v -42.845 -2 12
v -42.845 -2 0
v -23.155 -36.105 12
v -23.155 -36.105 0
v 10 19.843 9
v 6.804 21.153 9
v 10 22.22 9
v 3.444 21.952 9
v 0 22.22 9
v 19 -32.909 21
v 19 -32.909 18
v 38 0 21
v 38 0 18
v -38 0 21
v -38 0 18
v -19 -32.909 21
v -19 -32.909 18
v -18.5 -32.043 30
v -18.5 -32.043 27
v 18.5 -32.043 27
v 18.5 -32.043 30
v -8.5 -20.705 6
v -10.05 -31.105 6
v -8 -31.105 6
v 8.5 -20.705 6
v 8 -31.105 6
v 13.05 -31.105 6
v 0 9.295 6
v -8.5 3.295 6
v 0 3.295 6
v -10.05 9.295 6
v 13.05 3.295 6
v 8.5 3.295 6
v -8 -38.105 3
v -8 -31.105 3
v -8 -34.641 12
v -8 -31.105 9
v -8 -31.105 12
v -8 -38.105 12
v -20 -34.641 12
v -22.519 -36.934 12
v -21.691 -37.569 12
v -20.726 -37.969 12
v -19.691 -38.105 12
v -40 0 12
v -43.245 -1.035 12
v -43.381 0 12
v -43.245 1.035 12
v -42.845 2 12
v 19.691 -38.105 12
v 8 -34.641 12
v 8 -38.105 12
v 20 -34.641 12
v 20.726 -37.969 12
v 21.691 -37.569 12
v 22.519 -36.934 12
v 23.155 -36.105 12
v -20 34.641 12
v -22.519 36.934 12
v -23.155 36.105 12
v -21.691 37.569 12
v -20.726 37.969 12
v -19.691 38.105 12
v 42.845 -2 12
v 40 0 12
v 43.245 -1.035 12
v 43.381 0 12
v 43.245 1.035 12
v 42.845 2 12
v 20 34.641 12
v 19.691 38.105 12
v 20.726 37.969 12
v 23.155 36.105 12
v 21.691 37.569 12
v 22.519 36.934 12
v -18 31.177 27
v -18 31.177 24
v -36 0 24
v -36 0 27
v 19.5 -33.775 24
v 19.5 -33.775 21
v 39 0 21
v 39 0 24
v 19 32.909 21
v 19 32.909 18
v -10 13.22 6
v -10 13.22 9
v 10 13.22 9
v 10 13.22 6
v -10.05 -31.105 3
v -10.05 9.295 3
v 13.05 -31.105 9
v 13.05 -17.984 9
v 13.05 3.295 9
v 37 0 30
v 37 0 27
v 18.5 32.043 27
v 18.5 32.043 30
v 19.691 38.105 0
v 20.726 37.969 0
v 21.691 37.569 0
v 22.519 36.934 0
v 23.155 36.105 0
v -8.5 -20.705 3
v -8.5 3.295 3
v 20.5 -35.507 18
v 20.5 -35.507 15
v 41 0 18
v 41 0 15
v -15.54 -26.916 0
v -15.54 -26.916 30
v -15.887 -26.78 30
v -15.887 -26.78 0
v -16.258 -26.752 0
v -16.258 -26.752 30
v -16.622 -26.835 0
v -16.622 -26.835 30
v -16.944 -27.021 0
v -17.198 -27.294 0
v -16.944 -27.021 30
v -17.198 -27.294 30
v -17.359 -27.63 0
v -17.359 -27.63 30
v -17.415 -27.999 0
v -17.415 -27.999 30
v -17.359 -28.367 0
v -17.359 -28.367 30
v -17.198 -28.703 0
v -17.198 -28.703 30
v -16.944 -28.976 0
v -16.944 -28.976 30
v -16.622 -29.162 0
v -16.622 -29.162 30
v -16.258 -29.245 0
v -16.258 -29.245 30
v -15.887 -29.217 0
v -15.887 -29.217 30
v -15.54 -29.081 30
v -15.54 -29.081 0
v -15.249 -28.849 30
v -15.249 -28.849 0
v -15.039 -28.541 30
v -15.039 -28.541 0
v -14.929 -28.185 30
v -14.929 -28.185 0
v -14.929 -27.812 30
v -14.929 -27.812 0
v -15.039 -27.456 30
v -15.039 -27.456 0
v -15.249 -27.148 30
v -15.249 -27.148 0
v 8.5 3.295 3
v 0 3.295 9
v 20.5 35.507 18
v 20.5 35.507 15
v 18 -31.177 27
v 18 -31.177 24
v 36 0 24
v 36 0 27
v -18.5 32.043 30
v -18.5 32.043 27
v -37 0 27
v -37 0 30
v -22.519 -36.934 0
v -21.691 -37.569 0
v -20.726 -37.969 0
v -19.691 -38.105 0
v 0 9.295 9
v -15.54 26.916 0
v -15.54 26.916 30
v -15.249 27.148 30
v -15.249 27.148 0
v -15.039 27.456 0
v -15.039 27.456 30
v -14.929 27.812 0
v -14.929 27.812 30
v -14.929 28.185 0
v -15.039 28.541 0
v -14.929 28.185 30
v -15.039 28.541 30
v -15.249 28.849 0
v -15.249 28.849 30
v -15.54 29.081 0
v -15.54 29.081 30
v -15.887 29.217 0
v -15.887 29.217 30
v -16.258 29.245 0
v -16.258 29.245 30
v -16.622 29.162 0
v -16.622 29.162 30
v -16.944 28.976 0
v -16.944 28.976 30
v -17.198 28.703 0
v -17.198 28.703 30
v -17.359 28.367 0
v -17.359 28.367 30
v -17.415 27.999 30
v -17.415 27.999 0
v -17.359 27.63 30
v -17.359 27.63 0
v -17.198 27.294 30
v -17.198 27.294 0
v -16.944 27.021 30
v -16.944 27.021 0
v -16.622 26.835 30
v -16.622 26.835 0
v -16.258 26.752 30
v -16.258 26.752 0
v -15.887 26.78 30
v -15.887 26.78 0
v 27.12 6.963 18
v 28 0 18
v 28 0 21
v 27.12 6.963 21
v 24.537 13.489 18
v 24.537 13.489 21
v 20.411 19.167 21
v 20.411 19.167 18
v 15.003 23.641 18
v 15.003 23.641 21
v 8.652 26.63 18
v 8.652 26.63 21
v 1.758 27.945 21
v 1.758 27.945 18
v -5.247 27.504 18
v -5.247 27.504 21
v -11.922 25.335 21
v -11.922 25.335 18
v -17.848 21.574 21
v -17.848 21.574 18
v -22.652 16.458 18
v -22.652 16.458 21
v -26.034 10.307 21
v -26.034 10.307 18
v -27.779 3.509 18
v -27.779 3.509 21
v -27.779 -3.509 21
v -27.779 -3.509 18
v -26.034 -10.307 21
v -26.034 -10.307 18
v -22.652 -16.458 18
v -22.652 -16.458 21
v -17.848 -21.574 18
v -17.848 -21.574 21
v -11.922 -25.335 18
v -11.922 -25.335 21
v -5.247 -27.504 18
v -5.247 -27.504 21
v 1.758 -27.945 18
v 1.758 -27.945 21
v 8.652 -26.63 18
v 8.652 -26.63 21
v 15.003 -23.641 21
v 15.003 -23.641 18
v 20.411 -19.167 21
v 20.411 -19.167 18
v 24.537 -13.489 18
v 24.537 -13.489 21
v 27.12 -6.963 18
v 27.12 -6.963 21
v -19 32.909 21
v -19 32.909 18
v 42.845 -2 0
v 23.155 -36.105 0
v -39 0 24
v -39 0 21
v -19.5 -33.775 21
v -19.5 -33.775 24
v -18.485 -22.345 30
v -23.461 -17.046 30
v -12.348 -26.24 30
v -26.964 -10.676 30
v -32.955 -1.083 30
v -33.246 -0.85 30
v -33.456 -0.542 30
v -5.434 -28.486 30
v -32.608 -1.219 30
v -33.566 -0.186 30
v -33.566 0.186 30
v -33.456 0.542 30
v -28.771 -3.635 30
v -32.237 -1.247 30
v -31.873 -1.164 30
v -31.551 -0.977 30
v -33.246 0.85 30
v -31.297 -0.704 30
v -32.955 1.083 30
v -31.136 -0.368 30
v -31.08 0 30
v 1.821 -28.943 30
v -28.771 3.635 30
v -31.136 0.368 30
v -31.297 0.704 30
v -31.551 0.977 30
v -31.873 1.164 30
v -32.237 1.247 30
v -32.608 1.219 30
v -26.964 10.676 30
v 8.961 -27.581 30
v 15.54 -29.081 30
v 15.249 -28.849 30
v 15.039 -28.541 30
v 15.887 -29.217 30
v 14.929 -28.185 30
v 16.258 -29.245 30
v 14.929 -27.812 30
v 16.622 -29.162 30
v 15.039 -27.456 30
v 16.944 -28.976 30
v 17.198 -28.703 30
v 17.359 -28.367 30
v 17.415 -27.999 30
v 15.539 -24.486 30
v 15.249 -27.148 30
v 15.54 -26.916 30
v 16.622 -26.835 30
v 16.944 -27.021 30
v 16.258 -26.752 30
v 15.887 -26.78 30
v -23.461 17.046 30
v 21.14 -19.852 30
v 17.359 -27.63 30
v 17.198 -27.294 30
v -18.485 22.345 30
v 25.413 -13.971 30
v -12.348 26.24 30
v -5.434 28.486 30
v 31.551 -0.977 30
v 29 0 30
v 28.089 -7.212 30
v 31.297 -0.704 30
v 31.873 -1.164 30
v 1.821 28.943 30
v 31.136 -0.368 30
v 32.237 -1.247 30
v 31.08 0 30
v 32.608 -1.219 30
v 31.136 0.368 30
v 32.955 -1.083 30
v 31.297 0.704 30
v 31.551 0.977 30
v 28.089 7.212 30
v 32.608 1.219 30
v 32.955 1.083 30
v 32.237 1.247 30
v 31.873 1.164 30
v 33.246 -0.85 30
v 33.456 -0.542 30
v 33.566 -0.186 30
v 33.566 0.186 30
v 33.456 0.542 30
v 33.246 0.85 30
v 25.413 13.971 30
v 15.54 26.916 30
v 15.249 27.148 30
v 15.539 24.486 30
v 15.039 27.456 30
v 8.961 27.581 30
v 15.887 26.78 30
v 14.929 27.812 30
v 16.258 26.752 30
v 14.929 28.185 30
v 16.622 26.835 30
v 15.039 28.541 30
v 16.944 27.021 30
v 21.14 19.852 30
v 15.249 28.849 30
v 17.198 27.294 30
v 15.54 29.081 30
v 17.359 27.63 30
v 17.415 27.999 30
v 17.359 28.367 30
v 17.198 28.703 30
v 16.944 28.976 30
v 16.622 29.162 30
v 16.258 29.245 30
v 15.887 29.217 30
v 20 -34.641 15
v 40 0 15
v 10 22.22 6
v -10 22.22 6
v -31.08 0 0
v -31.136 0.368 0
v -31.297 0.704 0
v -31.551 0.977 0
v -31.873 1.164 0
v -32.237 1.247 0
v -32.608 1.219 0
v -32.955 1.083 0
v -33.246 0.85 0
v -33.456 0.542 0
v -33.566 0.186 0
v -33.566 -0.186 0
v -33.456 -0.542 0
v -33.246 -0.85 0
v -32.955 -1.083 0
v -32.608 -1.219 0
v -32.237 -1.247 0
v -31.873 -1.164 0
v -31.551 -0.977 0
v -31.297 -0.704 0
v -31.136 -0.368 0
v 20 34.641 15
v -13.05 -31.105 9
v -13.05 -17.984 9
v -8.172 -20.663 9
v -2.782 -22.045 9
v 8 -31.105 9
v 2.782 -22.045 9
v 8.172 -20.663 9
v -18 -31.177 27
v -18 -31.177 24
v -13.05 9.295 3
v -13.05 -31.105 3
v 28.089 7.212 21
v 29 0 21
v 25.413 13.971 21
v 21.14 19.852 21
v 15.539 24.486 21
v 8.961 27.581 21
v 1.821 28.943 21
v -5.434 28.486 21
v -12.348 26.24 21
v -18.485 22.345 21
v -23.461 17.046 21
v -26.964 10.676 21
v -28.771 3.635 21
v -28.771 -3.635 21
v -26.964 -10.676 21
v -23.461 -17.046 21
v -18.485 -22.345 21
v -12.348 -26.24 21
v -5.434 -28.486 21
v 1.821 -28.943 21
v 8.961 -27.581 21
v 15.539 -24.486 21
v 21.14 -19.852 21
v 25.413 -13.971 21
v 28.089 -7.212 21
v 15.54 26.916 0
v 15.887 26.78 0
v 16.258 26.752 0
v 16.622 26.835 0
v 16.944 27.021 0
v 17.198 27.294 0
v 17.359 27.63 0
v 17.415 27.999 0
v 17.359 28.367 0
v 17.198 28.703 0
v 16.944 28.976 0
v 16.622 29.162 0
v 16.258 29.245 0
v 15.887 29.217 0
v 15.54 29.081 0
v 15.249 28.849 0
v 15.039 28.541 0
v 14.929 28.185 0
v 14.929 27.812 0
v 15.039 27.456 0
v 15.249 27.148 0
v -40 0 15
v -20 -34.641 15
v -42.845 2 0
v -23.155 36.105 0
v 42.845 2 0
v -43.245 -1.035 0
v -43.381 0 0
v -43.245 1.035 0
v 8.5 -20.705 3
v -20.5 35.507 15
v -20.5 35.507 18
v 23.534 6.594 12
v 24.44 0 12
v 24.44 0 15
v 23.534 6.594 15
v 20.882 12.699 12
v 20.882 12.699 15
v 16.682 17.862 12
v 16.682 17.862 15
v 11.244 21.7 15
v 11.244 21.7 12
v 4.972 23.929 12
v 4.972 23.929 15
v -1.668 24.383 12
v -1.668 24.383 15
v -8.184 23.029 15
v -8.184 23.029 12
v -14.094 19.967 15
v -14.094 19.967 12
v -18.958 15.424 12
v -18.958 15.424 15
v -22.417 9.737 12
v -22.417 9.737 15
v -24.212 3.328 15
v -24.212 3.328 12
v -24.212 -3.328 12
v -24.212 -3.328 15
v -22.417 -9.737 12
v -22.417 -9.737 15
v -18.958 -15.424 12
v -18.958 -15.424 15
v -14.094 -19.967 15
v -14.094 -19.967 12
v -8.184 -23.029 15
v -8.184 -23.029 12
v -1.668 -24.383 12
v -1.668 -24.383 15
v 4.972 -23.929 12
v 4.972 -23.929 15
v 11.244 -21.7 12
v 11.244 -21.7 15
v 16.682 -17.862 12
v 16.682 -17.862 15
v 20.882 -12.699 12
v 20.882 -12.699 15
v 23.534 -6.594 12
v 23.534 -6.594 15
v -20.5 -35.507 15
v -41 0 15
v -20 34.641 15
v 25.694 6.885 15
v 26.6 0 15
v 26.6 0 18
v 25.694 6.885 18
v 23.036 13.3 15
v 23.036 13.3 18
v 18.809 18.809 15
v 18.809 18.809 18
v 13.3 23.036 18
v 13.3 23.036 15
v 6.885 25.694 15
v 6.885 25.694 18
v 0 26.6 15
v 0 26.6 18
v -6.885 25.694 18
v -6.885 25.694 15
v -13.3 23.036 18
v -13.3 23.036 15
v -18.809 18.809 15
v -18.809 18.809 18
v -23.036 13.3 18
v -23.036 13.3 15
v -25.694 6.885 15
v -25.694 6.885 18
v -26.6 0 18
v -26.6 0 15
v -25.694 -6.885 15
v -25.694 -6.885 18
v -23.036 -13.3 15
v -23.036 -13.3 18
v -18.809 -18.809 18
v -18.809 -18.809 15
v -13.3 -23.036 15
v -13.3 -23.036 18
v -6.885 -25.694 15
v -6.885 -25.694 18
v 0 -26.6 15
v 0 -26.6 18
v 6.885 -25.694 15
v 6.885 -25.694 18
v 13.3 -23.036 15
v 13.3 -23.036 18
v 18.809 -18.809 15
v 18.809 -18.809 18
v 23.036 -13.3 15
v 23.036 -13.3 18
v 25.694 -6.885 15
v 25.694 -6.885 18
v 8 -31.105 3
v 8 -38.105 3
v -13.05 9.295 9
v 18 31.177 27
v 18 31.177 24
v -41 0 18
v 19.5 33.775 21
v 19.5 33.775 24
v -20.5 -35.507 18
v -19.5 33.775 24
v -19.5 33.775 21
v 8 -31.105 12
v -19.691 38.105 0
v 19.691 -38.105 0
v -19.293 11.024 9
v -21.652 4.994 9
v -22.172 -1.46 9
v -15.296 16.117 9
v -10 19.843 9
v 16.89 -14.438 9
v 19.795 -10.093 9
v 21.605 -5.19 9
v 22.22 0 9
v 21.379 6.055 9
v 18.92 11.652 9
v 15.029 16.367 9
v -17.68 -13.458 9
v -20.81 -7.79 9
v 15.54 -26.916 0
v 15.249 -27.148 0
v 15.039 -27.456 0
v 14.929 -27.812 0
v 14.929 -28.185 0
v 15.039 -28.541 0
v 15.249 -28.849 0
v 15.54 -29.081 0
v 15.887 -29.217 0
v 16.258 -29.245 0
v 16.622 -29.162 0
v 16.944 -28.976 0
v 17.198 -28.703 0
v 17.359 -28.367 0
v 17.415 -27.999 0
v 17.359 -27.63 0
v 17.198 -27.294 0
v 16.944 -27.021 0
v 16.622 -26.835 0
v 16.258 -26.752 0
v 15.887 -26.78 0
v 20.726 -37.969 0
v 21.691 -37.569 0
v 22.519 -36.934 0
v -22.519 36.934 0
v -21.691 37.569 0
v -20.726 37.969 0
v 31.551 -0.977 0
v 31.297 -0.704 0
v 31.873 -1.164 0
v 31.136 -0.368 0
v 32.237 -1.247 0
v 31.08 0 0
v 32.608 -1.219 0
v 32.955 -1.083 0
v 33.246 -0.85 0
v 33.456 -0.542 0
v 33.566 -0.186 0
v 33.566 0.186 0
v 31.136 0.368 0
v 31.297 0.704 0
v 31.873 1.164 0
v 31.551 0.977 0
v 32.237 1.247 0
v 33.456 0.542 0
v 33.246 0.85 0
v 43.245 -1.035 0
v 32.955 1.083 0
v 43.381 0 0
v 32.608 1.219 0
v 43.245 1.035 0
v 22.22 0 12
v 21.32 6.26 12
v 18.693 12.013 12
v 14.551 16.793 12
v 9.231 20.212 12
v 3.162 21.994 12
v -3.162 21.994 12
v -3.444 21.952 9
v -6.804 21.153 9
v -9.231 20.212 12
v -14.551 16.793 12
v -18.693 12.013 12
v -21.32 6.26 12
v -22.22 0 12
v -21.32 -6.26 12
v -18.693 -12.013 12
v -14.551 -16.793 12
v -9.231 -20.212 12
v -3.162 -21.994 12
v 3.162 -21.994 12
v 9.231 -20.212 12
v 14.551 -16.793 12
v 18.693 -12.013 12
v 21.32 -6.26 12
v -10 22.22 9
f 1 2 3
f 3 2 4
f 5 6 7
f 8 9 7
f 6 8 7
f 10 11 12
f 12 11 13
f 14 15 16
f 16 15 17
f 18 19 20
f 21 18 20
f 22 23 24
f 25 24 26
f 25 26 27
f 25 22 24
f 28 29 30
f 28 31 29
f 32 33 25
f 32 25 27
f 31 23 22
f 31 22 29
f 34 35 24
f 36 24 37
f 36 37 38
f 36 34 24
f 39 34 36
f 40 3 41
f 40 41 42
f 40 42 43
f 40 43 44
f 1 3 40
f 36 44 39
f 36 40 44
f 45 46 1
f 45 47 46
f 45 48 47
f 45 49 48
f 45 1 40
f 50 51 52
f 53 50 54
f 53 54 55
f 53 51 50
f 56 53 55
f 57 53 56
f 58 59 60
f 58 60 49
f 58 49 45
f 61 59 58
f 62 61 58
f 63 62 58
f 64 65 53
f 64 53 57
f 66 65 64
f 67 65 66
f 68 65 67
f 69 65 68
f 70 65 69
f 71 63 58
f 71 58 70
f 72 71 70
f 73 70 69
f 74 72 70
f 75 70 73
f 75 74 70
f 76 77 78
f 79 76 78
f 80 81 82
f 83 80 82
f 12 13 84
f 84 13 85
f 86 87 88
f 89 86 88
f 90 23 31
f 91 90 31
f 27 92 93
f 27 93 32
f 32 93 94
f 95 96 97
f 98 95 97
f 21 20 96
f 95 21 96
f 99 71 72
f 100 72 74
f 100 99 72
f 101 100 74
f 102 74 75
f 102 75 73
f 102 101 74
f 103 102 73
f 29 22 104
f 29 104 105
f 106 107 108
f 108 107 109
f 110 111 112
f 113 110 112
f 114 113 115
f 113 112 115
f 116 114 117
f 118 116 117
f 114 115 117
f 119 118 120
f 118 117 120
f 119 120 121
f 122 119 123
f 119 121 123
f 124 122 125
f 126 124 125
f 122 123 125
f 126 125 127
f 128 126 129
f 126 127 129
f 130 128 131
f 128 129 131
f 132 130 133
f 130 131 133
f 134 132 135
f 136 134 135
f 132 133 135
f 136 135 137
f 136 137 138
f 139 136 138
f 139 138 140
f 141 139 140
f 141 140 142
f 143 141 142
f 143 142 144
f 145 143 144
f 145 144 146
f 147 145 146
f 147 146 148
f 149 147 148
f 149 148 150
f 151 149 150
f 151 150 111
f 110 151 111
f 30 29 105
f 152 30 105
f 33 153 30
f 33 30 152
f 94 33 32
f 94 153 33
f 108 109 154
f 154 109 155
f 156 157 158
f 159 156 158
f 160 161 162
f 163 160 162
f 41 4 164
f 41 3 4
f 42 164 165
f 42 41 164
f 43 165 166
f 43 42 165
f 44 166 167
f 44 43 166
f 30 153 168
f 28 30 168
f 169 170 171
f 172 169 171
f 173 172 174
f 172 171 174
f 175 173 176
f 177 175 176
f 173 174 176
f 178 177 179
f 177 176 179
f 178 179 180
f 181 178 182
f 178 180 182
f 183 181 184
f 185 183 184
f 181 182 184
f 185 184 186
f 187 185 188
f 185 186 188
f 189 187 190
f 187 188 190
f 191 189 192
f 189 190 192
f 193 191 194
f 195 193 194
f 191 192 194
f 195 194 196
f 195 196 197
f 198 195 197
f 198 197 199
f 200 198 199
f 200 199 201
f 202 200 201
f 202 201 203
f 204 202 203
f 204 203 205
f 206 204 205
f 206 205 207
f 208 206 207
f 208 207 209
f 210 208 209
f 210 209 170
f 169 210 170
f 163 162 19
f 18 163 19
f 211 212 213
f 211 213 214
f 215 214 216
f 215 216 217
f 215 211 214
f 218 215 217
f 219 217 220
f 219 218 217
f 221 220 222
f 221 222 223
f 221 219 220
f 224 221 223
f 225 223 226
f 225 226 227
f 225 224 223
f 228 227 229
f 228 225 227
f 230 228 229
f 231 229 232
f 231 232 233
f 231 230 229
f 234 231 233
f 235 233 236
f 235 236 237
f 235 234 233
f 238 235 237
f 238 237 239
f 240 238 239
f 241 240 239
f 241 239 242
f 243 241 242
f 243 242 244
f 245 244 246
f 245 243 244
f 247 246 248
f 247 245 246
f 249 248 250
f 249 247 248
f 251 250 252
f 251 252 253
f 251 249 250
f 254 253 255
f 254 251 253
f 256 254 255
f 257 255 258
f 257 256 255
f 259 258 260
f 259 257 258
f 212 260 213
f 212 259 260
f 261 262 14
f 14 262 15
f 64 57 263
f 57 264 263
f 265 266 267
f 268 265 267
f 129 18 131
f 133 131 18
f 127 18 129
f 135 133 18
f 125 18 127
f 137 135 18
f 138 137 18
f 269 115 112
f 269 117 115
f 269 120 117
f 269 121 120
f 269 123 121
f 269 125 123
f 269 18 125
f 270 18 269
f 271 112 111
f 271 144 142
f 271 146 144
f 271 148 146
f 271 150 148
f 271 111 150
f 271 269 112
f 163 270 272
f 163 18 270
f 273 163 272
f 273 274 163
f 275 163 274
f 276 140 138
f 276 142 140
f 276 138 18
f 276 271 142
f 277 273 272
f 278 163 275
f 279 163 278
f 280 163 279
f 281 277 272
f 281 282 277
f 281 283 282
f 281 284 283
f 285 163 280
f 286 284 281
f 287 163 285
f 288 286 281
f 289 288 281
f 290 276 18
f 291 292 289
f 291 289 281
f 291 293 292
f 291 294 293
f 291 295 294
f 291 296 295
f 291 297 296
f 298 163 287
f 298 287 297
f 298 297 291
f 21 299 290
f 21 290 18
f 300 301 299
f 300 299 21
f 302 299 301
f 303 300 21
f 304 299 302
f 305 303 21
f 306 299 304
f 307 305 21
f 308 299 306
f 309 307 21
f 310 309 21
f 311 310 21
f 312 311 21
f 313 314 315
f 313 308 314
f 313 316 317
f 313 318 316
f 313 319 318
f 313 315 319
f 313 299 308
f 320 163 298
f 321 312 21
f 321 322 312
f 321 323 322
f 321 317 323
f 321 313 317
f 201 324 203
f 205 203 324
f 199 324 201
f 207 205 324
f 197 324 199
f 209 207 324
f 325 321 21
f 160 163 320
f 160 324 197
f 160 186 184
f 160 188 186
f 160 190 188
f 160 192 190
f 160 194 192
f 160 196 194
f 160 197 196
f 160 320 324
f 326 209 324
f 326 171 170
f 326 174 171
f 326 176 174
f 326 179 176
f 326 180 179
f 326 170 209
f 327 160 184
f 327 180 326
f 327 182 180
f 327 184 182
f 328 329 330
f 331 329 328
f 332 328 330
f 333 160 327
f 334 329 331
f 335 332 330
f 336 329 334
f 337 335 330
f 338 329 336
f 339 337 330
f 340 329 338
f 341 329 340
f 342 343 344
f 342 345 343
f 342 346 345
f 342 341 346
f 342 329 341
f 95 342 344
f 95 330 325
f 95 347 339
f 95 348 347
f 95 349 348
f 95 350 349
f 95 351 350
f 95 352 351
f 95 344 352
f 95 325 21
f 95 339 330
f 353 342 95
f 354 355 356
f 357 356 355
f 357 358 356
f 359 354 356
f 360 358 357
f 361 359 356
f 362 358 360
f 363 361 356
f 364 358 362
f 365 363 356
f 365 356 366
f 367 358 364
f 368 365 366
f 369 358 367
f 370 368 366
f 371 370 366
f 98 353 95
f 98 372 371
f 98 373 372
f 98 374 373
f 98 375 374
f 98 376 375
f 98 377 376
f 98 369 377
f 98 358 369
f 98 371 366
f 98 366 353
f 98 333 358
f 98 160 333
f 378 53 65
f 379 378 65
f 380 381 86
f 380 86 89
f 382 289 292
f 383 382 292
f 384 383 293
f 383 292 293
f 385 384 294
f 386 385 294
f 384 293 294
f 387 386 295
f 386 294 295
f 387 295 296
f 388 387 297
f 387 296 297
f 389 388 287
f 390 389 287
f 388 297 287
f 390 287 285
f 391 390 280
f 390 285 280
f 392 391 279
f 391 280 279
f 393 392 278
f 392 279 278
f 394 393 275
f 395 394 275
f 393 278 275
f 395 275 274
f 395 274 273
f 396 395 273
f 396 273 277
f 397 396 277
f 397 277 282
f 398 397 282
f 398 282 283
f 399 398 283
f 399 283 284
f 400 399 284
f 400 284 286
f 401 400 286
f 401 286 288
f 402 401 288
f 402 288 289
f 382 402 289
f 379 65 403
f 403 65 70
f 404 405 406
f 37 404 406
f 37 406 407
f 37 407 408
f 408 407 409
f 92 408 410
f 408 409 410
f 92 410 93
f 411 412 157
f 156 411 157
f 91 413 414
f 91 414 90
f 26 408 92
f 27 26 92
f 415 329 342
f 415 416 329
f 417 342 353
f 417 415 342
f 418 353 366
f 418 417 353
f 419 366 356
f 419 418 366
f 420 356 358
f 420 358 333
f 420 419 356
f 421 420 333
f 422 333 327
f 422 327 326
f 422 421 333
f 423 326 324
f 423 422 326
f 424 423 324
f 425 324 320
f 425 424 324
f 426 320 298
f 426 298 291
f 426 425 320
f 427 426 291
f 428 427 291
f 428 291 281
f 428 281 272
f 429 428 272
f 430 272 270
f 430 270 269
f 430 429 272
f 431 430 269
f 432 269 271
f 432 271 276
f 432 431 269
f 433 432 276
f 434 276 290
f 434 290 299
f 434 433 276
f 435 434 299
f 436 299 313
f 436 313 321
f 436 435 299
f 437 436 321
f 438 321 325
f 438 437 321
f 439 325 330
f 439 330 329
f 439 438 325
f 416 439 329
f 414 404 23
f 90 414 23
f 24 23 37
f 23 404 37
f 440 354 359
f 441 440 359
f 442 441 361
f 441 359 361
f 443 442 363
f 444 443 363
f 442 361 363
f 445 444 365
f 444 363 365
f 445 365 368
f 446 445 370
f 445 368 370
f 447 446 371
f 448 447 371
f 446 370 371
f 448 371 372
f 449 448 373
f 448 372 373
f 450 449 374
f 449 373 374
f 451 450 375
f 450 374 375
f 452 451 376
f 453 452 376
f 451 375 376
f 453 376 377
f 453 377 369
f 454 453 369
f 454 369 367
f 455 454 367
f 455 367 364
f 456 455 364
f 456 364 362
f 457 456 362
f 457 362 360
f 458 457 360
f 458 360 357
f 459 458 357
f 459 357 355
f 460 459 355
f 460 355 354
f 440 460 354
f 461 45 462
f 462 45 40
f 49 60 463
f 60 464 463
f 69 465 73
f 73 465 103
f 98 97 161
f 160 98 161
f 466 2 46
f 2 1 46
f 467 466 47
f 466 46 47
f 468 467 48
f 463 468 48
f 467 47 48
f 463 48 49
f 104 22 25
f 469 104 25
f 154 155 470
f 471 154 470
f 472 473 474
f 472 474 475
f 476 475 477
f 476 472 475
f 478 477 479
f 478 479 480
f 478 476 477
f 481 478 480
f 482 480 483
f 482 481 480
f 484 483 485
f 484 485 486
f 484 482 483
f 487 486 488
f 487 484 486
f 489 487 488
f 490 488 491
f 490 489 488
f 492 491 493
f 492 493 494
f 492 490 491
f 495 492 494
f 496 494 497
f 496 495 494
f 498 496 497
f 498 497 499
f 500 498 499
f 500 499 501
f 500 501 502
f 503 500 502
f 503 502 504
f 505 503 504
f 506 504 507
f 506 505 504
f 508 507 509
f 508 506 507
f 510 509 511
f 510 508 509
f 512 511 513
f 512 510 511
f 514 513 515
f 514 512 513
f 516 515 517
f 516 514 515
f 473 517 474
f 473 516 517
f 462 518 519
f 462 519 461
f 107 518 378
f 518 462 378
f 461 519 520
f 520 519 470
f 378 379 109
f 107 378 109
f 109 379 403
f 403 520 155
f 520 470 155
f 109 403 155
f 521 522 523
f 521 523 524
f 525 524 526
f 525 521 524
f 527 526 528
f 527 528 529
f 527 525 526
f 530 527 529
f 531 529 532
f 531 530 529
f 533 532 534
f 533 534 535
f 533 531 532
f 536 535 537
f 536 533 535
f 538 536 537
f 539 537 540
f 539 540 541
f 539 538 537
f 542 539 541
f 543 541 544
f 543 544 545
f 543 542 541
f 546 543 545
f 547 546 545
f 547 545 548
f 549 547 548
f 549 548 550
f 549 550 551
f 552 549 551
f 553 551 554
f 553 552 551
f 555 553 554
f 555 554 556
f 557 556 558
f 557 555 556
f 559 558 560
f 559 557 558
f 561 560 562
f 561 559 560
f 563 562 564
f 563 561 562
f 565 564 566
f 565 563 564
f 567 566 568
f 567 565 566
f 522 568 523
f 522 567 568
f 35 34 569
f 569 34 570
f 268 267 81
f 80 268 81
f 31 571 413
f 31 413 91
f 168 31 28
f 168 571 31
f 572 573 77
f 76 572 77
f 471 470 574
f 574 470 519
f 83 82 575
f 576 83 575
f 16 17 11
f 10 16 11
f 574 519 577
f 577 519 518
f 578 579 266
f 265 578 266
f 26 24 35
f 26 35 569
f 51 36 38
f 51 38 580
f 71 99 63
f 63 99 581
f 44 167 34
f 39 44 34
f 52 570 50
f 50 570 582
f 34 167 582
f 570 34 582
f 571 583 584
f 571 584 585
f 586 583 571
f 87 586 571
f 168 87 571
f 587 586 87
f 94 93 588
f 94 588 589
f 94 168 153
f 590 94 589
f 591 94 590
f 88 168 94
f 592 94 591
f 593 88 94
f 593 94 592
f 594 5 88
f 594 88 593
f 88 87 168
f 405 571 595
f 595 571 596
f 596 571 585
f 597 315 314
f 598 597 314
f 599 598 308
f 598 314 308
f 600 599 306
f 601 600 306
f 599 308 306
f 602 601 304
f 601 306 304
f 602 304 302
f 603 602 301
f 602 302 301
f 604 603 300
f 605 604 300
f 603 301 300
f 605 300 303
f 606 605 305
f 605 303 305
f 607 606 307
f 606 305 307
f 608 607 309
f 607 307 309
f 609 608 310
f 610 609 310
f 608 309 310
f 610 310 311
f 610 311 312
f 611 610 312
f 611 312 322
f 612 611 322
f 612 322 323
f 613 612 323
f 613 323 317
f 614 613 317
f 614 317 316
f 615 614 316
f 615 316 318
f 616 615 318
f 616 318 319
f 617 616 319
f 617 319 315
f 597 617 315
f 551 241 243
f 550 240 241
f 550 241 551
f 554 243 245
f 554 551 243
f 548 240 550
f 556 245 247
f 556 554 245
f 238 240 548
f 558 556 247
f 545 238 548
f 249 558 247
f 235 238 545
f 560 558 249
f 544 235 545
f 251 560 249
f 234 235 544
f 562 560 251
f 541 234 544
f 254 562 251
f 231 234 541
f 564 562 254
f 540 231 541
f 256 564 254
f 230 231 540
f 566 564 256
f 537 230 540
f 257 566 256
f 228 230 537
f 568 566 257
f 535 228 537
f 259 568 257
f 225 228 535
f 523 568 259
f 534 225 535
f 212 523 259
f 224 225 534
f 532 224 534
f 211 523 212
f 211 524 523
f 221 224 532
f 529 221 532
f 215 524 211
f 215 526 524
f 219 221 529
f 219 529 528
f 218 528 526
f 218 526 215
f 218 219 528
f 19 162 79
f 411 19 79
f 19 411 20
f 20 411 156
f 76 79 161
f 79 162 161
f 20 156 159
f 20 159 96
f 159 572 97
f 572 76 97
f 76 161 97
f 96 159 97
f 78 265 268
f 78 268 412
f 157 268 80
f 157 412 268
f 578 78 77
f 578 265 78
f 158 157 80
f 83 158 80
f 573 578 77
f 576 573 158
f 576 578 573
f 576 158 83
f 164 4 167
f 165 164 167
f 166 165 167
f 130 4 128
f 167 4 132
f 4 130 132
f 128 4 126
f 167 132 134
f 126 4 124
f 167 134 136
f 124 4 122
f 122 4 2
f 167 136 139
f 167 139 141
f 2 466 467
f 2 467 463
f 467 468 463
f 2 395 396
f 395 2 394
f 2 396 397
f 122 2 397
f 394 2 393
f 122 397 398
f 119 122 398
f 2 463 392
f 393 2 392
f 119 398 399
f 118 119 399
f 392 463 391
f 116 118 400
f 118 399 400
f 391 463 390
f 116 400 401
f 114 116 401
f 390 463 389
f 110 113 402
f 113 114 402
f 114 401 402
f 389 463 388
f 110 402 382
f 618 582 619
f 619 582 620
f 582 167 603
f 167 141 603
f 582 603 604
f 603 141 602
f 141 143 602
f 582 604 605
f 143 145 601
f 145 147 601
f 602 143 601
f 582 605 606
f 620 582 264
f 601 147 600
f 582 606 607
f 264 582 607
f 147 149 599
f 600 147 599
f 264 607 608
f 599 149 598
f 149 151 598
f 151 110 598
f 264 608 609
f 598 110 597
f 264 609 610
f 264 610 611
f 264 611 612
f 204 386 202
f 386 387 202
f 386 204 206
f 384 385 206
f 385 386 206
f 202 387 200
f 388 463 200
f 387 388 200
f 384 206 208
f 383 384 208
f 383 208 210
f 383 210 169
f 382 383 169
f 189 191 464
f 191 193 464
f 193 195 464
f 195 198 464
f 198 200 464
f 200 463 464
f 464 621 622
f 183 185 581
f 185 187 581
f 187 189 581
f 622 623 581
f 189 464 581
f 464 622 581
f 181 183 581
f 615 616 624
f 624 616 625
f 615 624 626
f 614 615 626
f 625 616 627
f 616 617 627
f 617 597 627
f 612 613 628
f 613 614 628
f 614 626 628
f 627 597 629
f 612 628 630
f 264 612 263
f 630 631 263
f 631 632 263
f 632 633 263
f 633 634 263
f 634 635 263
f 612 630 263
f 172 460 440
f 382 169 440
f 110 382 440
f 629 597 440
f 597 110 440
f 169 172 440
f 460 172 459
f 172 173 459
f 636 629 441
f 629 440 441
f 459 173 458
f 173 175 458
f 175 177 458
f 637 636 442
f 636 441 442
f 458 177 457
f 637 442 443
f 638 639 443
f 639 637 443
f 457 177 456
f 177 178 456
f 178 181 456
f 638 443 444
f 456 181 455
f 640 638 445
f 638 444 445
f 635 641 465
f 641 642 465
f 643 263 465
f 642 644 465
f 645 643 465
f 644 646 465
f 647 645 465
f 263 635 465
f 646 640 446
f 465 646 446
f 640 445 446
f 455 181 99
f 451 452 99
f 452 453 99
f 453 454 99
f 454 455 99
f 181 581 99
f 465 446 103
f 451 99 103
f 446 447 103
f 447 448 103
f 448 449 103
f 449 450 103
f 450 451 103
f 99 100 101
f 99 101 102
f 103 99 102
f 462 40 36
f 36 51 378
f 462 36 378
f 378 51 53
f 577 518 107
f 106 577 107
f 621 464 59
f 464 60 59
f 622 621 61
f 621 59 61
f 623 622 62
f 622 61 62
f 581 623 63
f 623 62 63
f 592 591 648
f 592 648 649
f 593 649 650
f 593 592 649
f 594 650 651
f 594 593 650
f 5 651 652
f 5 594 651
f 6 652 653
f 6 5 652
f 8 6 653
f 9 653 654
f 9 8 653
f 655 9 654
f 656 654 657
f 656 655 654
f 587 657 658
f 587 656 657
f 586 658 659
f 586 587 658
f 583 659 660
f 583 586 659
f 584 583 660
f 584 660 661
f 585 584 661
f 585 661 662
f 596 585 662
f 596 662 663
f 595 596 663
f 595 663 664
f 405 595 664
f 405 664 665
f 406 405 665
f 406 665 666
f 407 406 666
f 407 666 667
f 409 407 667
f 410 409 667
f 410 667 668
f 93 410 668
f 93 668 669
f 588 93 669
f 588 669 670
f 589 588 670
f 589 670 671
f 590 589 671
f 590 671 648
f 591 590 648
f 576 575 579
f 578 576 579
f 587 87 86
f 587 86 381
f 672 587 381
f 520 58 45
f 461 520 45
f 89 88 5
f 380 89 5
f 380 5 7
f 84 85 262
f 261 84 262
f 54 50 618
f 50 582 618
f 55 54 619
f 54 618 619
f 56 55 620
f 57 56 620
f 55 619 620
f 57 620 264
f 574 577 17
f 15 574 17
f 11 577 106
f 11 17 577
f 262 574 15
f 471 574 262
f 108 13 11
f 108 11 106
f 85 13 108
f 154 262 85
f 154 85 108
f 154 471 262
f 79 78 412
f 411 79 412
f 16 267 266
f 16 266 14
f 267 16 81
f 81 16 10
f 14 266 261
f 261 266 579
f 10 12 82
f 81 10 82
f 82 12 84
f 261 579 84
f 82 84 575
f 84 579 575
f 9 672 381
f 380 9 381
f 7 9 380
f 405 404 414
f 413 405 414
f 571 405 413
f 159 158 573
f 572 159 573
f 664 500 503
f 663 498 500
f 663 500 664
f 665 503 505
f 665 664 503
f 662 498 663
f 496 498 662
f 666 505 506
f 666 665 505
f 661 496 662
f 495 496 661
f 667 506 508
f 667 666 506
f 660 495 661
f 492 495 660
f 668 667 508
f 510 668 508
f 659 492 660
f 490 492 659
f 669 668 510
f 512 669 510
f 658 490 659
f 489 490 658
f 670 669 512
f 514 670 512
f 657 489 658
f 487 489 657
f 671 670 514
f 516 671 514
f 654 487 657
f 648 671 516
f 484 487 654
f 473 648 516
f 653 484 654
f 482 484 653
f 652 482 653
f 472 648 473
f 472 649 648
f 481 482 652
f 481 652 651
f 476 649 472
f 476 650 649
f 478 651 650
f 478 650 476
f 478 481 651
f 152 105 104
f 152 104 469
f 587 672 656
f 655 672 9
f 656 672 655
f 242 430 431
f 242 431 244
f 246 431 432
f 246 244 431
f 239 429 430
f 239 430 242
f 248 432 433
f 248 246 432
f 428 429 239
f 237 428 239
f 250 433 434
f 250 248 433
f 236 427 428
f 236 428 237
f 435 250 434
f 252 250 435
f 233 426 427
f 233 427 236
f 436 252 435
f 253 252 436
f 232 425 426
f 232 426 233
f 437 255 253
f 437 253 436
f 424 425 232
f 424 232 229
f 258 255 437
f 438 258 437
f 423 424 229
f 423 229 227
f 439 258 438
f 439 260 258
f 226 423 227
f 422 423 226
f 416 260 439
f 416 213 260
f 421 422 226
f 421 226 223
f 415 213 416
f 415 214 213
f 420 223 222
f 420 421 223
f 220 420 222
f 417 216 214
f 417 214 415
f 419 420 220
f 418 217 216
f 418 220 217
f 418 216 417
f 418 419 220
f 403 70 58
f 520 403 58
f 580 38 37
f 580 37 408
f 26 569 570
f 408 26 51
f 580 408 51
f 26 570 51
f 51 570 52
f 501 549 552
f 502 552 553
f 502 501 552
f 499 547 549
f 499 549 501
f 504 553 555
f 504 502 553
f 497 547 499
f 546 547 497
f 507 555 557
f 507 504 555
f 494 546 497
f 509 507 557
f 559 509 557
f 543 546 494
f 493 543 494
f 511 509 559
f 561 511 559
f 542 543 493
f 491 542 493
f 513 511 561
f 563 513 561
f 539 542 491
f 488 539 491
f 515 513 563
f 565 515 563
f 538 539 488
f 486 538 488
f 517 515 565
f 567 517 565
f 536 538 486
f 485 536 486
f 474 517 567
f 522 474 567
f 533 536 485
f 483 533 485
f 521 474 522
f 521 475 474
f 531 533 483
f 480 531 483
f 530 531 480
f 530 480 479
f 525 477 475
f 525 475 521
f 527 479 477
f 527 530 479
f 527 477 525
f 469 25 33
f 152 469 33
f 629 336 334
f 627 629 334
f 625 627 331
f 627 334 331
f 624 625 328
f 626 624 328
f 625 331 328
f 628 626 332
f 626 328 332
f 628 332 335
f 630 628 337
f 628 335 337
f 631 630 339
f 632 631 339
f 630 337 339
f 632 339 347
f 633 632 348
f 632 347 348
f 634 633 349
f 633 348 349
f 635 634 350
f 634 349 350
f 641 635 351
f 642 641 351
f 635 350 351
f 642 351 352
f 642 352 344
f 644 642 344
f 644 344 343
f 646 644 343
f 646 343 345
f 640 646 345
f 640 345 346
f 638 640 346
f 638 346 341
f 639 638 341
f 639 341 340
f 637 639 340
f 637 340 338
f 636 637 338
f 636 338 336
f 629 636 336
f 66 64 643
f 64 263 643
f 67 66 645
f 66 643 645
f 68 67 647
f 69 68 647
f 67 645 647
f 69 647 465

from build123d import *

# Parameters (mm, degrees)
PAD_DEPTH          = 9
SKETCH001_W        = 26.1
SKETCH001_H        = 34.4
POCKET_DEPTH       = 3
SKETCH002_R        = 22.22
PAD001_DEPTH       = 3
SKETCH003_R        = 24.44
PAD002_DEPTH       = 3
SKETCH004_R        = 26.6
PAD003_DEPTH       = 3
SKETCH005_R        = 28
PAD004_DEPTH       = 3
SKETCH006_R        = 29
PAD005_DEPTH       = 3
SKETCH007_R        = 29
PAD006_DEPTH       = 3
SKETCH008_R        = 29
PAD007_DEPTH       = 3
SKETCH009_W        = 17
SKETCH009_H        = 24
POCKET001_DEPTH    = 3
SKETCH010_W        = 16
SKETCH010_H        = 9
POCKET002_DEPTH    = 7
SKETCH011_W        = 20
SKETCH011_H        = 9
POCKET003_DEPTH    = 3
SKETCH012_R        = 1.25
POCKET004_DEPTH    = 270.433943
POLARPATTERN_COUNT = 6
SKETCH013_W        = 3
SKETCH013_H        = 38
POCKET005_DEPTH    = 3
SKETCH014_W        = 3
SKETCH014_H        = 6
POCKET006_DEPTH    = 6
SKETCH015_W        = 10.05
SKETCH015_H        = 6
POCKET007_DEPTH    = 3
FILLET_R           = 4


with BuildPart() as part:
    # Sketch → Pad (new body)
    with BuildSketch(Plane.XY):
        Polygon((44, 0), (22, 38.105118), (-22, 38.105118), (-44, 0), (-22, -38.105118), (22, -38.105118), align=None)
    extrude(amount=PAD_DEPTH)

    # Sketch001 (on Face8 of Pad) → Pocket (cut)
    with BuildSketch(Plane.XY.offset(9)):
        with Locations((0, -13.905118)):
            Rectangle(SKETCH001_W, SKETCH001_H)
    extrude(amount=-POCKET_DEPTH, mode=Mode.SUBTRACT)

    # Sketch002 (on Face5 of Pocket) → Pad001 (join)
    with BuildSketch(Plane.XY.offset(9)):
        Polygon((22, 38.105118), (-22, 38.105118), (-44, 0), (-22, -38.105118), (22, -38.105118), (44, 0), align=None)
        Circle(SKETCH002_R, mode=Mode.SUBTRACT)
    extrude(amount=PAD001_DEPTH)

    # Sketch003 (on Face14 of Pad001) → Pad002 (join)
    with BuildSketch(Plane.XY.offset(12)):
        Polygon((40, 0), (20, 34.641016), (-20, 34.641016), (-40, 0), (-20, -34.641016), (20, -34.641016), align=None)
        Circle(SKETCH003_R, mode=Mode.SUBTRACT)
    extrude(amount=PAD002_DEPTH)

    # Sketch004 (on Face21 of Pad002) → Pad003 (join)
    with BuildSketch(Plane.XY.offset(15)):
        Polygon((41, 0), (20.5, 35.507042), (-20.5, 35.507042), (-41, 0), (-20.5, -35.507042), (20.5, -35.507042), align=None)
        Circle(SKETCH004_R, mode=Mode.SUBTRACT)
    extrude(amount=PAD003_DEPTH)

    # Sketch005 (on Face28 of Pad003) → Pad004 (join)
    with BuildSketch(Plane.XY.offset(18)):
        Polygon((19, 32.908965), (-19, 32.908965), (-38, 0), (-19, -32.908965), (19, -32.908965), (38, 0), align=None)
        Circle(SKETCH005_R, mode=Mode.SUBTRACT)
    extrude(amount=PAD004_DEPTH)

    # Sketch006 (on Face35 of Pad004) → Pad005 (join)
    with BuildSketch(Plane.XY.offset(21)):
        Polygon((39, 0), (19.5, 33.774991), (-19.5, 33.774991), (-39, 0), (-19.5, -33.774991), (19.5, -33.774991), align=None)
        Circle(SKETCH006_R, mode=Mode.SUBTRACT)
    extrude(amount=PAD005_DEPTH)

    # Sketch007 (on Face42 of Pad005) → Pad006 (join)
    with BuildSketch(Plane.XY.offset(24)):
        Polygon((36, 0), (18, 31.176915), (-18, 31.176915), (-36, 0), (-18, -31.176915), (18, -31.176915), align=None)
        Circle(SKETCH007_R, mode=Mode.SUBTRACT)
    extrude(amount=PAD006_DEPTH)

    # Sketch008 (on Face49 of Pad006) → Pad007 (join)
    with BuildSketch(Plane.XY.offset(27)):
        Polygon((37, 0), (18.5, 32.04294), (-18.5, 32.04294), (-37, 0), (-18.5, -32.04294), (18.5, -32.04294), align=None)
        Circle(SKETCH008_R, mode=Mode.SUBTRACT)
    extrude(amount=PAD007_DEPTH)

    # Sketch009 (on Face74 of Pad007) → Pocket001 (cut)
    with BuildSketch(Plane.XY.offset(6)):
        with Locations((0, -8.705118)):
            Rectangle(SKETCH009_W, SKETCH009_H)
    extrude(amount=-POCKET001_DEPTH, mode=Mode.SUBTRACT)

    # Sketch010 (on Face12 of Pocket001) → Pocket002 (cut)
    with BuildSketch(Plane.XZ.offset(38.105118)):
        with Locations((0, 7.5)):
            Rectangle(SKETCH010_W, SKETCH010_H)
    extrude(amount=-POCKET002_DEPTH, mode=Mode.SUBTRACT)

    # Sketch011 (on Face40 of Pocket002) → Pocket003 (cut)
    with BuildSketch(Plane.XY.offset(9)):
        with Locations((0, 17.72)):
            Rectangle(SKETCH011_W, SKETCH011_H)
    extrude(amount=-POCKET003_DEPTH, mode=Mode.SUBTRACT)

    # Sketch012 (on Face93 of Pocket003) → Pocket004 (cut, through all)
    with BuildSketch(Plane.XY.offset(30)):
        with Locations((-32.33, 0)):
            Circle(SKETCH012_R)
    pocket004 = extrude(amount=-POCKET004_DEPTH, mode=Mode.SUBTRACT)

    # PolarPattern: Pocket004 ×6 about axis
    polarpattern_axis = Axis((0, 0, 30), (0, 0, 1))
    for i in range(1, POLARPATTERN_COUNT):
        add(pocket004.rotate(polarpattern_axis, i * 360 / POLARPATTERN_COUNT), mode=Mode.SUBTRACT)

    # Sketch013 (on Face45 of PolarPattern) → Pocket005 (cut)
    with BuildSketch(Plane.XY.offset(6)):
        with Locations((-11.55, -12.105118)):
            Rectangle(SKETCH013_W, SKETCH013_H)
    extrude(amount=-POCKET005_DEPTH, mode=Mode.SUBTRACT)

    # Sketch014 (on Face58 of Pocket005) → Pocket006 (cut)
    with BuildSketch(Plane.XY.offset(9)):
        with Locations((-11.55, 6.294882)):
            Rectangle(SKETCH014_W, SKETCH014_H)
    extrude(amount=-POCKET006_DEPTH, mode=Mode.SUBTRACT)

    # Sketch015 (on Face58 of Pocket006) → Pocket007 (cut)
    with BuildSketch(Plane.XY.offset(9)):
        with Locations((-5.025, 6.294882)):
            Rectangle(SKETCH015_W, SKETCH015_H)
    extrude(amount=-POCKET007_DEPTH, mode=Mode.SUBTRACT)

    # Fillet
    fillet_edges = [part.edges().sort_by_distance(p)[0] for p in [
        (22, -38.105118, 4.5),
        (44, 0, 4.5),
        (22, 38.105118, 4.5),
        (-22, 38.105118, 4.5),
        (-44, 0, 4.5),
        (-22, -38.105118, 4.5),
    ]]
    fillet(fillet_edges, radius=FILLET_R)


solid = part.part
